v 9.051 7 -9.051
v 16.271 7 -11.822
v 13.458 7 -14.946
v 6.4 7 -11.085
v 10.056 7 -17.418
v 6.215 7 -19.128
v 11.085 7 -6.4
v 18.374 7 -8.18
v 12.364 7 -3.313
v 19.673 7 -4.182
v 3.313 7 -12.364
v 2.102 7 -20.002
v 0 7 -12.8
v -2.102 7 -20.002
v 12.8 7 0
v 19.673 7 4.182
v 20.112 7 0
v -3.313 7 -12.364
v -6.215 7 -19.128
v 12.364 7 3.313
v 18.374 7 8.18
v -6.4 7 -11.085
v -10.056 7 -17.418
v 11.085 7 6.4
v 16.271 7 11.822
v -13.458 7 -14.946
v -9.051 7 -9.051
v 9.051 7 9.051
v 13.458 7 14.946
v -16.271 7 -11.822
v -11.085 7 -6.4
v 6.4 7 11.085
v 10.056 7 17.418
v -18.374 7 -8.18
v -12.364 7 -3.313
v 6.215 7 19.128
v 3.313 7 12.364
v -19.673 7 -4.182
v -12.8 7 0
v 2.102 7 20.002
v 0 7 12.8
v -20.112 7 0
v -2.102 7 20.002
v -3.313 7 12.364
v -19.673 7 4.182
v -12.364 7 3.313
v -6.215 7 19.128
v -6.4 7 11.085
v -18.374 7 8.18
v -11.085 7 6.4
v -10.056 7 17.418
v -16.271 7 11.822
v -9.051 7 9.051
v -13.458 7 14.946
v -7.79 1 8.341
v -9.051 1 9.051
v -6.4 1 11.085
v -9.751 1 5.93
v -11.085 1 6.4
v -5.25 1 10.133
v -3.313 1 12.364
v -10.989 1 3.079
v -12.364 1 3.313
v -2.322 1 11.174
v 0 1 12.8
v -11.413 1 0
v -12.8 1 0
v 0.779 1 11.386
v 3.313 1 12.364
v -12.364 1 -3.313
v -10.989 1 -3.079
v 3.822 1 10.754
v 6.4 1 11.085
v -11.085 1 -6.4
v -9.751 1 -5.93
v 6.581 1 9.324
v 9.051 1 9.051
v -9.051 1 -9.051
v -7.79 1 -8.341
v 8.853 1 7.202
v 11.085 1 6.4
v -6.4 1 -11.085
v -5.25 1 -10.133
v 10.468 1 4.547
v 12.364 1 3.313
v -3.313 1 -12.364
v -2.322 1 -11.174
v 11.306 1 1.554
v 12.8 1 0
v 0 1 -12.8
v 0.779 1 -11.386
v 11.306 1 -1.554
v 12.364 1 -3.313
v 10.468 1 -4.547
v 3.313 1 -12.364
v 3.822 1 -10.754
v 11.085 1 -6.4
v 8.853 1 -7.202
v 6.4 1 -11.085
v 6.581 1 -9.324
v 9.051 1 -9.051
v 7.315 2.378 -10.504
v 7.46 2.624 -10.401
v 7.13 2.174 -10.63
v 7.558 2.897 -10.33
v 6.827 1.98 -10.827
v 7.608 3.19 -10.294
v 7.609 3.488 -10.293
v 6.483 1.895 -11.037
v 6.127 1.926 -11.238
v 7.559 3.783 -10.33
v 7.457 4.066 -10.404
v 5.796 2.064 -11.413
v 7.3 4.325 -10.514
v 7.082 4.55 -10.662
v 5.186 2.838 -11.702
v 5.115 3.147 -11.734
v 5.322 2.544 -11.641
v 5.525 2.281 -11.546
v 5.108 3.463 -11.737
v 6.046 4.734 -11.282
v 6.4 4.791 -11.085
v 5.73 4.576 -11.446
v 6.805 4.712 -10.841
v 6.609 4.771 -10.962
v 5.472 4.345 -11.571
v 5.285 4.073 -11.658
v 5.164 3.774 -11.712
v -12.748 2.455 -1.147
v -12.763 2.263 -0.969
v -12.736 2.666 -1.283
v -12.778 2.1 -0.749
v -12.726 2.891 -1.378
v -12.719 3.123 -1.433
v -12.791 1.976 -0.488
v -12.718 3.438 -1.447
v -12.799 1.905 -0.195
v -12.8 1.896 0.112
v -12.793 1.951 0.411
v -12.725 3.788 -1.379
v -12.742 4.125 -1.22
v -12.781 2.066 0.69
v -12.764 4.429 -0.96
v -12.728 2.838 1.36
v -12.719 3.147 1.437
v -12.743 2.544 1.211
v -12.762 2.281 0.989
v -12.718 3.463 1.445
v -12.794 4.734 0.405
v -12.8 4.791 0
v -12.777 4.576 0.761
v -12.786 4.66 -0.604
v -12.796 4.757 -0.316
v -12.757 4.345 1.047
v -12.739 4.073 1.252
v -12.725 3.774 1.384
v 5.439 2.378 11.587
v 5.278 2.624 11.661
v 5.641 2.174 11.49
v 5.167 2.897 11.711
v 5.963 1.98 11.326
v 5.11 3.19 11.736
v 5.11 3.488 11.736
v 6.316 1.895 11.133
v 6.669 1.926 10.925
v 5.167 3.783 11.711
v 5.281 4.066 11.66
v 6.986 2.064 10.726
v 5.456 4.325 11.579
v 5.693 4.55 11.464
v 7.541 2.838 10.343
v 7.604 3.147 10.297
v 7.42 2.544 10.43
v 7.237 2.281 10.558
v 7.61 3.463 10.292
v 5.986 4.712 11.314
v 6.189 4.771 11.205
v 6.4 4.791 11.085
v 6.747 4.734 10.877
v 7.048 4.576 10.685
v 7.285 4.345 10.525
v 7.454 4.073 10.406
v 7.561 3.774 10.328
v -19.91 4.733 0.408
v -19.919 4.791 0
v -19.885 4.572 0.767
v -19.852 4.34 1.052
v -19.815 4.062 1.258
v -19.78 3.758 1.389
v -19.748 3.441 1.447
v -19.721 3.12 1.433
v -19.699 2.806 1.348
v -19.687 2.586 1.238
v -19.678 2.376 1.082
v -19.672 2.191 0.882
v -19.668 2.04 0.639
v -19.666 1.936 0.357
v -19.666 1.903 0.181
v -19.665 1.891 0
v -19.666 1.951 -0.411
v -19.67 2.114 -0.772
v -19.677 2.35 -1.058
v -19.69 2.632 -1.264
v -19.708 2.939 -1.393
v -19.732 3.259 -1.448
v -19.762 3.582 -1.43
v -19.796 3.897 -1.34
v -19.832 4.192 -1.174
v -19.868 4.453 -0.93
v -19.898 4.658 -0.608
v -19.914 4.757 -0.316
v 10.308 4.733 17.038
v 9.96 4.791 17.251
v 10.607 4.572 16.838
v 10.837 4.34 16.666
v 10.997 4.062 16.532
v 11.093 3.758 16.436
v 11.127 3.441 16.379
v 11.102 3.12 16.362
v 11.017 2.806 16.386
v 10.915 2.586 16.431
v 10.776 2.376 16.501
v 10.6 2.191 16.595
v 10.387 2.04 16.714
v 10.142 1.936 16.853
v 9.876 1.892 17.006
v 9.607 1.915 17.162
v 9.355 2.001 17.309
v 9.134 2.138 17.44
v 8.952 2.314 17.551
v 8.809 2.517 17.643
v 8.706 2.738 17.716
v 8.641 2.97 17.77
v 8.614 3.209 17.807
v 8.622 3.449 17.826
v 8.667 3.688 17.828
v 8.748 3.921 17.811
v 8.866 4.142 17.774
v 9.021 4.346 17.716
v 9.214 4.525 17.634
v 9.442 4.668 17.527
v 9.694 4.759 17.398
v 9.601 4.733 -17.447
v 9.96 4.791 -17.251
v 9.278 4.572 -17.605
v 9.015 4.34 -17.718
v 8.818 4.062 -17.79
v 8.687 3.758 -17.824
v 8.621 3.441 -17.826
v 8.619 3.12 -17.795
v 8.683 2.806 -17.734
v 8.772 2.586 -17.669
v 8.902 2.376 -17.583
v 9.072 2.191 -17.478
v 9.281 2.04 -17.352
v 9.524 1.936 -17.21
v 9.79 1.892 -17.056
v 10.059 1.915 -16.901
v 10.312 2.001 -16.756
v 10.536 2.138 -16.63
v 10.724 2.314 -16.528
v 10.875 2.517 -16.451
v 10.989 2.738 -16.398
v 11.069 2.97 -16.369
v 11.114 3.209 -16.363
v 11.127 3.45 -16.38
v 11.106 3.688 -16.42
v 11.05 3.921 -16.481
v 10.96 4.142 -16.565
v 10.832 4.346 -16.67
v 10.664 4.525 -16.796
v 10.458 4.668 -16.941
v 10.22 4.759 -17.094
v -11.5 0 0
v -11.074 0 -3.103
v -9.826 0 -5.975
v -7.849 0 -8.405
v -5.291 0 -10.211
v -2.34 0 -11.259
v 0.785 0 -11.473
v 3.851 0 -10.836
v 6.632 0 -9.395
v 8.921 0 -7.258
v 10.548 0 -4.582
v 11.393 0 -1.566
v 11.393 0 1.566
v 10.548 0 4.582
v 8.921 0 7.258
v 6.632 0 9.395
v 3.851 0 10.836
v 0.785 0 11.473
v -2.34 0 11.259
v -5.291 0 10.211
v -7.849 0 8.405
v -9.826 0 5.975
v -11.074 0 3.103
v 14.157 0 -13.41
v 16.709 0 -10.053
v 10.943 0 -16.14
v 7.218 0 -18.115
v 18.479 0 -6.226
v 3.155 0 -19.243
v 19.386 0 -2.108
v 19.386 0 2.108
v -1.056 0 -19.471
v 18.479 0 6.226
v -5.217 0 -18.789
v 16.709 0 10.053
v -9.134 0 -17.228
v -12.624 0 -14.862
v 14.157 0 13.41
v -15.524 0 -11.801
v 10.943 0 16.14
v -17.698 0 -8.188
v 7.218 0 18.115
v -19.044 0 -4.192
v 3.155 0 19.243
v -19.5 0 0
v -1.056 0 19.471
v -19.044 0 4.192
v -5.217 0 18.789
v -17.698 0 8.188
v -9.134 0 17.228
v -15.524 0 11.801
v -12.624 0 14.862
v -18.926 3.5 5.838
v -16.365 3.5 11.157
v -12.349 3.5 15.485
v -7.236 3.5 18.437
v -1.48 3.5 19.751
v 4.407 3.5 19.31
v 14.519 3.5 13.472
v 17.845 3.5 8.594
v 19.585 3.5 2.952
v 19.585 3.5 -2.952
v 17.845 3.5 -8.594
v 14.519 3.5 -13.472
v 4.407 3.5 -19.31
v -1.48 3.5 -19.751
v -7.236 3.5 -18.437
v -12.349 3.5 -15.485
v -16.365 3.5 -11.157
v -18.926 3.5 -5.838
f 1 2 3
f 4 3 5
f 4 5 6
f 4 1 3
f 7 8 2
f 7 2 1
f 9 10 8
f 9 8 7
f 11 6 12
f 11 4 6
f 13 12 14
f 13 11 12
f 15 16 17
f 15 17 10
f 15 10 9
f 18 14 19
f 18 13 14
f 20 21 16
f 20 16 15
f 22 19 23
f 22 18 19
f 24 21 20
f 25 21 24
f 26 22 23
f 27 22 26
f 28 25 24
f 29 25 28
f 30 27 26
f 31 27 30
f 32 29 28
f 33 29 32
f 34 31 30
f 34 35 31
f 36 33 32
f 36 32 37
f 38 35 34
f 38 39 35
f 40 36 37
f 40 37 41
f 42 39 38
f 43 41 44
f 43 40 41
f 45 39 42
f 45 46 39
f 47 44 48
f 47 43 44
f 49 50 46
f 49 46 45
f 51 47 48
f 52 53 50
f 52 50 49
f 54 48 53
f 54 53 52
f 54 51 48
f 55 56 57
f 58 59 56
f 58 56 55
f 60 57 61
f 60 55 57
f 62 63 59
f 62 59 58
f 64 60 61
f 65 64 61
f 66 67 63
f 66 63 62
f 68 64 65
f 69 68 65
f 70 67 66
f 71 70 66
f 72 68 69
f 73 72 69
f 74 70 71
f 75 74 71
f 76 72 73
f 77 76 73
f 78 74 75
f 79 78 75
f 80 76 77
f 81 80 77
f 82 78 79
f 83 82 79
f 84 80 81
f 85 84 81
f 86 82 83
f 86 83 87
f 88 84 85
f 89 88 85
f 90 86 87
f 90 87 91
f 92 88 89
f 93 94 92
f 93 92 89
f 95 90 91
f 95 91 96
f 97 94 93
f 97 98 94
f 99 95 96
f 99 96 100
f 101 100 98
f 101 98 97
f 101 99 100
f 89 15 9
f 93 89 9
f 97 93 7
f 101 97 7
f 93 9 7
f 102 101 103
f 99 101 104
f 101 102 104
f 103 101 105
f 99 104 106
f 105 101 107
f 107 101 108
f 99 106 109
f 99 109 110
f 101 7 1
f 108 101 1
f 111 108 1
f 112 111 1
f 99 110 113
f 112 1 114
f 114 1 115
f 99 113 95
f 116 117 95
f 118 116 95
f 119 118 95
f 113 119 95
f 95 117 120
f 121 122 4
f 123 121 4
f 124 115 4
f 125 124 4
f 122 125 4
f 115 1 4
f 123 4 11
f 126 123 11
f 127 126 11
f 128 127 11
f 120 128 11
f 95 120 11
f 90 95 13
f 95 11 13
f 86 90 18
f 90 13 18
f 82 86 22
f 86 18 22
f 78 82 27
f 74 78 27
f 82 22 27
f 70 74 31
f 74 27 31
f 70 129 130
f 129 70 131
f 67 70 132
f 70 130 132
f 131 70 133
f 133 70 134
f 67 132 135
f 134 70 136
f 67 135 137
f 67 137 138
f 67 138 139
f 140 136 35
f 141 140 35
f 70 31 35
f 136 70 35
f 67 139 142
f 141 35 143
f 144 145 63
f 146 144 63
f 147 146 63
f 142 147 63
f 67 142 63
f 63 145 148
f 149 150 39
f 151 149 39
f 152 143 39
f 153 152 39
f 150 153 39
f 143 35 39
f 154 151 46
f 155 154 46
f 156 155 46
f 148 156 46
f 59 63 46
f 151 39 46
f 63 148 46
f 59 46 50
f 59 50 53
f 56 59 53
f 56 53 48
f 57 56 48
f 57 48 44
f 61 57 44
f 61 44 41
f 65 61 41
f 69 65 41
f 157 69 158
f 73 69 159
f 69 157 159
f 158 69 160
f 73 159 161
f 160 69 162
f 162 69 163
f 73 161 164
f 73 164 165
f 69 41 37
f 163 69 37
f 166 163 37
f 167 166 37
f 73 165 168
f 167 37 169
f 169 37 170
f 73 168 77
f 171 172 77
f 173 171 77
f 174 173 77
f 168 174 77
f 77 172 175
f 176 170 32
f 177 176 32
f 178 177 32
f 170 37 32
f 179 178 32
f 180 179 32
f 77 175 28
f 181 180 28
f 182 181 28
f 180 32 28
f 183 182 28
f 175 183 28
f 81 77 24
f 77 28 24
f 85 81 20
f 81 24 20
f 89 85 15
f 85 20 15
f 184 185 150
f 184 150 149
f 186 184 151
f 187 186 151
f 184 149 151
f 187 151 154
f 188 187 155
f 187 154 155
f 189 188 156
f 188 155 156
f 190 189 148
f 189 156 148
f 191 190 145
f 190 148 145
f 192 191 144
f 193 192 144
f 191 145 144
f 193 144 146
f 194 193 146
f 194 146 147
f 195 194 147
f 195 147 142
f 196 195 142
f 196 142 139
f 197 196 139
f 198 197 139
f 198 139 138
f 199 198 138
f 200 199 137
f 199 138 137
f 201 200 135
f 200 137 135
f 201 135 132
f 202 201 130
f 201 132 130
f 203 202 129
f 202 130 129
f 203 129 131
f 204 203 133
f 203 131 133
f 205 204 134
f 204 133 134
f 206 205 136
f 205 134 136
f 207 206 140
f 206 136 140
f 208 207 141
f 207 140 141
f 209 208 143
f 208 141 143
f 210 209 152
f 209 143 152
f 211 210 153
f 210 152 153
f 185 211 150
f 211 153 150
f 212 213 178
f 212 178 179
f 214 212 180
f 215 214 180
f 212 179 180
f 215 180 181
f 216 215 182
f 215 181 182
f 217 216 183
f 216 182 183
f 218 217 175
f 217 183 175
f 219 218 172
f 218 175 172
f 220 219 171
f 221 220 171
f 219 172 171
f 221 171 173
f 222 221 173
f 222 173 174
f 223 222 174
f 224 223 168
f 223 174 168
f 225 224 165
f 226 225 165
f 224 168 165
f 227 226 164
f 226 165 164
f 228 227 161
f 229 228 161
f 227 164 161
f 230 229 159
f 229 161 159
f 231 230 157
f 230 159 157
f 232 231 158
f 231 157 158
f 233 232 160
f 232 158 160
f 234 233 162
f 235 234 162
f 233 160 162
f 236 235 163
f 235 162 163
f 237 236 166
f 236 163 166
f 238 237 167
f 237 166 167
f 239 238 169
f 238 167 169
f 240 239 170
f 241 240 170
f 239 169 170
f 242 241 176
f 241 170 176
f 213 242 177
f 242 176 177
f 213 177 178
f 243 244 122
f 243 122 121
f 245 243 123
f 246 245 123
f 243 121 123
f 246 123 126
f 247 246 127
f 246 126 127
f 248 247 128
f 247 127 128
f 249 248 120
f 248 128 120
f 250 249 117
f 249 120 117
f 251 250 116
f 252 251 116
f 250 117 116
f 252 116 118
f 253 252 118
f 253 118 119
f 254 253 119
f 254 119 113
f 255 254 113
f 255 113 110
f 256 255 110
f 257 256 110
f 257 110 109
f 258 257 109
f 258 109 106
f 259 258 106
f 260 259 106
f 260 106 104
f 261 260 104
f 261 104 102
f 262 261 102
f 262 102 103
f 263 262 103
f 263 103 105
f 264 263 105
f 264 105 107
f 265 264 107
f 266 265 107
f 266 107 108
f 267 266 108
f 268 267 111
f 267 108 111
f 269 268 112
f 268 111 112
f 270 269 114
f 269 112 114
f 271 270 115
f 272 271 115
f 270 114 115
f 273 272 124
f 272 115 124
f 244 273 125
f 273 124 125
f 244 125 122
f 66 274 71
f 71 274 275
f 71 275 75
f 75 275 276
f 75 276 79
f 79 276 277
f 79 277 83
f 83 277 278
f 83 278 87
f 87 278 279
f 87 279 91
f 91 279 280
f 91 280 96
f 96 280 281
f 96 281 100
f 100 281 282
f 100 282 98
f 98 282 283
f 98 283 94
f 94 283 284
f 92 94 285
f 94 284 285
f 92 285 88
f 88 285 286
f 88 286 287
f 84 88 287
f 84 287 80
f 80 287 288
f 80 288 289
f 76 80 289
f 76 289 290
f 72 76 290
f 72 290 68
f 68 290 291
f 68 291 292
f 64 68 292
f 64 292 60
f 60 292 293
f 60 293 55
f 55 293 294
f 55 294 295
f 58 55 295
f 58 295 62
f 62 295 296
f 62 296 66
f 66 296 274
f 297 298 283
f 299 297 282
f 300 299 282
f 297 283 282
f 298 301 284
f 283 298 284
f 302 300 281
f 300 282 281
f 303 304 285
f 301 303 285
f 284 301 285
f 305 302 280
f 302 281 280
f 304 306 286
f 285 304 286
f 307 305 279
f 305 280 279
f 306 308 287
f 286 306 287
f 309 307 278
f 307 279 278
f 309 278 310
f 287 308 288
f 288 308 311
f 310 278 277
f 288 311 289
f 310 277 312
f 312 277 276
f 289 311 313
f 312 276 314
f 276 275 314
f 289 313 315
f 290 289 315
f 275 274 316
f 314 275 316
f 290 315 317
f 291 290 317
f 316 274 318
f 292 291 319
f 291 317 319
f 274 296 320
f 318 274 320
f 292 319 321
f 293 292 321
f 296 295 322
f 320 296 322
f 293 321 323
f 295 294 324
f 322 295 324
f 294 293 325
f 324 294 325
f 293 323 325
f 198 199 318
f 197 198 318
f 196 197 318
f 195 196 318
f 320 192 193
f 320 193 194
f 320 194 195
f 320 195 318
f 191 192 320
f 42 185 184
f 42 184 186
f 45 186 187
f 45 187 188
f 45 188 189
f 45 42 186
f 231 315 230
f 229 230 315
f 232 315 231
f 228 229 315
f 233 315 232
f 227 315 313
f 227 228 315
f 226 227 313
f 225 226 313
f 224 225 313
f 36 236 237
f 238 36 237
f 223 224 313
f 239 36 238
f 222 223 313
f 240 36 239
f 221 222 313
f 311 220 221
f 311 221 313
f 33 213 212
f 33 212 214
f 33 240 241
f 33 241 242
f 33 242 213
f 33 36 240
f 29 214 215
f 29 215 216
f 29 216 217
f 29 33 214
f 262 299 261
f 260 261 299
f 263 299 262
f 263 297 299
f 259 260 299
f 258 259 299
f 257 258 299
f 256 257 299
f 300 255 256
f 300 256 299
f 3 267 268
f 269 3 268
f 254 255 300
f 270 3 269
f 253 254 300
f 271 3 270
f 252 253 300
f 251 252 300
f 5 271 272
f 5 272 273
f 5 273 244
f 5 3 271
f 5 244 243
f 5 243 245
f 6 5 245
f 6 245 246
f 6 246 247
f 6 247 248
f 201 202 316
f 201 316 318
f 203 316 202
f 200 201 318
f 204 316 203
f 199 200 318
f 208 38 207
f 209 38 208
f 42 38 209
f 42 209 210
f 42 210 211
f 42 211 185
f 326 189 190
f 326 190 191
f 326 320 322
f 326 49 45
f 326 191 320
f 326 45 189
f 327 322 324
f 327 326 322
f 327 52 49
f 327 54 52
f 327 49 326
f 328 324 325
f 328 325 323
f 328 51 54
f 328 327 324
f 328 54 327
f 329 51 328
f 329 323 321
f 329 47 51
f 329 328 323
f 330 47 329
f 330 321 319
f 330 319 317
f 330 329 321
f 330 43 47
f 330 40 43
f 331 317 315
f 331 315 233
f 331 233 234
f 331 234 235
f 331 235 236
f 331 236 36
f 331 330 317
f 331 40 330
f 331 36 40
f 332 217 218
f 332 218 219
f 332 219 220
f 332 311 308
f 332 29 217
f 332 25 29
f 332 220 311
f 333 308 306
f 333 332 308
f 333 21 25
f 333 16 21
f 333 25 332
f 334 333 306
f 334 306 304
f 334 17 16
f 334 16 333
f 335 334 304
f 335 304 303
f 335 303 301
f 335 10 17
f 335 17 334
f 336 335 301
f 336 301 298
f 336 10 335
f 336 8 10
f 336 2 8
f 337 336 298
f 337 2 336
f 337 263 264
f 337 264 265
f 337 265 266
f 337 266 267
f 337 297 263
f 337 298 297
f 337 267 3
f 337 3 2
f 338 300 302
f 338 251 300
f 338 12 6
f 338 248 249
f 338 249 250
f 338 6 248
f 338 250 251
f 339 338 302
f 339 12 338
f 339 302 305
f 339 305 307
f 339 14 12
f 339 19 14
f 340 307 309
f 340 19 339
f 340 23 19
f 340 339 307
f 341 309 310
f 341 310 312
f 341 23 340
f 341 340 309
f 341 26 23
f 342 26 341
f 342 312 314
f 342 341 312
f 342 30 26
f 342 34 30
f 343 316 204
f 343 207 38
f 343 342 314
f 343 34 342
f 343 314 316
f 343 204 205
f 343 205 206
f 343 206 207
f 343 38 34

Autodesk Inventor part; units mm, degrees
ref_plane "YZ Plane" through (0, 0, 0) normal (1, 0, 0) x (0, 1, 0)
ref_plane "XZ Plane" through (0, 0, 0) normal (0, 1, 0) x (-1, 0, 0)
ref_plane "XY Plane" through (0, 0, 0) normal (0, 0, 1) x (1, 0, 0)
sketch "Skizze1" plane through (0, 0, 0) normal (0, 1, 0) x (-1, 0, 0)
  circle A0 centre (0, 0) radius 19.5
  line L0 (-8, 0) -> (8, 0) construction
  circle A1 centre (0, 0) radius 11.5
  dimension "d0" = 39
  dimension "d1" = 8
  dimension "d8" = 23
extrude "Extrusion1" add sketch "Skizze1" along normal blind 7 draft 5
sketch "Skizze2" plane through (0, 7, 0) normal (0, 1, 0) x (1, 0, 0)
  circle A0 centre (0, 0) radius 20.1124 projected
  circle A1 centre (0, 0) radius 12.8
  dimension "d5" = 25.6
extrude "Extrusion2" cut sketch "Skizze2" against normal blind 6 contours A1
sketch "Skizze3" plane through (0, 0, 0) normal (1, 0, 0) x (0, 1, 0)
  line L0 (7, 20.1124) -> (7, -20.1124) projected
  line L1 (0, -19.5) -> (0, 19.5) projected
  circle A0 centre (3.3414, 0) radius 1.45
  point P0 (0, 0)
  dimension "d9" = 2.9
extrude "Extrusion3" cut sketch "Skizze3" against normal through all
pattern_circular "Runde Anordnung1" count 3 over 360 about axis through (0, 7, 0) along (0, -1, 0) of "Extrusion3"
properties part number "50_Filteradapter_Fluorescence_CCVTV_Berrybase_100mm"
